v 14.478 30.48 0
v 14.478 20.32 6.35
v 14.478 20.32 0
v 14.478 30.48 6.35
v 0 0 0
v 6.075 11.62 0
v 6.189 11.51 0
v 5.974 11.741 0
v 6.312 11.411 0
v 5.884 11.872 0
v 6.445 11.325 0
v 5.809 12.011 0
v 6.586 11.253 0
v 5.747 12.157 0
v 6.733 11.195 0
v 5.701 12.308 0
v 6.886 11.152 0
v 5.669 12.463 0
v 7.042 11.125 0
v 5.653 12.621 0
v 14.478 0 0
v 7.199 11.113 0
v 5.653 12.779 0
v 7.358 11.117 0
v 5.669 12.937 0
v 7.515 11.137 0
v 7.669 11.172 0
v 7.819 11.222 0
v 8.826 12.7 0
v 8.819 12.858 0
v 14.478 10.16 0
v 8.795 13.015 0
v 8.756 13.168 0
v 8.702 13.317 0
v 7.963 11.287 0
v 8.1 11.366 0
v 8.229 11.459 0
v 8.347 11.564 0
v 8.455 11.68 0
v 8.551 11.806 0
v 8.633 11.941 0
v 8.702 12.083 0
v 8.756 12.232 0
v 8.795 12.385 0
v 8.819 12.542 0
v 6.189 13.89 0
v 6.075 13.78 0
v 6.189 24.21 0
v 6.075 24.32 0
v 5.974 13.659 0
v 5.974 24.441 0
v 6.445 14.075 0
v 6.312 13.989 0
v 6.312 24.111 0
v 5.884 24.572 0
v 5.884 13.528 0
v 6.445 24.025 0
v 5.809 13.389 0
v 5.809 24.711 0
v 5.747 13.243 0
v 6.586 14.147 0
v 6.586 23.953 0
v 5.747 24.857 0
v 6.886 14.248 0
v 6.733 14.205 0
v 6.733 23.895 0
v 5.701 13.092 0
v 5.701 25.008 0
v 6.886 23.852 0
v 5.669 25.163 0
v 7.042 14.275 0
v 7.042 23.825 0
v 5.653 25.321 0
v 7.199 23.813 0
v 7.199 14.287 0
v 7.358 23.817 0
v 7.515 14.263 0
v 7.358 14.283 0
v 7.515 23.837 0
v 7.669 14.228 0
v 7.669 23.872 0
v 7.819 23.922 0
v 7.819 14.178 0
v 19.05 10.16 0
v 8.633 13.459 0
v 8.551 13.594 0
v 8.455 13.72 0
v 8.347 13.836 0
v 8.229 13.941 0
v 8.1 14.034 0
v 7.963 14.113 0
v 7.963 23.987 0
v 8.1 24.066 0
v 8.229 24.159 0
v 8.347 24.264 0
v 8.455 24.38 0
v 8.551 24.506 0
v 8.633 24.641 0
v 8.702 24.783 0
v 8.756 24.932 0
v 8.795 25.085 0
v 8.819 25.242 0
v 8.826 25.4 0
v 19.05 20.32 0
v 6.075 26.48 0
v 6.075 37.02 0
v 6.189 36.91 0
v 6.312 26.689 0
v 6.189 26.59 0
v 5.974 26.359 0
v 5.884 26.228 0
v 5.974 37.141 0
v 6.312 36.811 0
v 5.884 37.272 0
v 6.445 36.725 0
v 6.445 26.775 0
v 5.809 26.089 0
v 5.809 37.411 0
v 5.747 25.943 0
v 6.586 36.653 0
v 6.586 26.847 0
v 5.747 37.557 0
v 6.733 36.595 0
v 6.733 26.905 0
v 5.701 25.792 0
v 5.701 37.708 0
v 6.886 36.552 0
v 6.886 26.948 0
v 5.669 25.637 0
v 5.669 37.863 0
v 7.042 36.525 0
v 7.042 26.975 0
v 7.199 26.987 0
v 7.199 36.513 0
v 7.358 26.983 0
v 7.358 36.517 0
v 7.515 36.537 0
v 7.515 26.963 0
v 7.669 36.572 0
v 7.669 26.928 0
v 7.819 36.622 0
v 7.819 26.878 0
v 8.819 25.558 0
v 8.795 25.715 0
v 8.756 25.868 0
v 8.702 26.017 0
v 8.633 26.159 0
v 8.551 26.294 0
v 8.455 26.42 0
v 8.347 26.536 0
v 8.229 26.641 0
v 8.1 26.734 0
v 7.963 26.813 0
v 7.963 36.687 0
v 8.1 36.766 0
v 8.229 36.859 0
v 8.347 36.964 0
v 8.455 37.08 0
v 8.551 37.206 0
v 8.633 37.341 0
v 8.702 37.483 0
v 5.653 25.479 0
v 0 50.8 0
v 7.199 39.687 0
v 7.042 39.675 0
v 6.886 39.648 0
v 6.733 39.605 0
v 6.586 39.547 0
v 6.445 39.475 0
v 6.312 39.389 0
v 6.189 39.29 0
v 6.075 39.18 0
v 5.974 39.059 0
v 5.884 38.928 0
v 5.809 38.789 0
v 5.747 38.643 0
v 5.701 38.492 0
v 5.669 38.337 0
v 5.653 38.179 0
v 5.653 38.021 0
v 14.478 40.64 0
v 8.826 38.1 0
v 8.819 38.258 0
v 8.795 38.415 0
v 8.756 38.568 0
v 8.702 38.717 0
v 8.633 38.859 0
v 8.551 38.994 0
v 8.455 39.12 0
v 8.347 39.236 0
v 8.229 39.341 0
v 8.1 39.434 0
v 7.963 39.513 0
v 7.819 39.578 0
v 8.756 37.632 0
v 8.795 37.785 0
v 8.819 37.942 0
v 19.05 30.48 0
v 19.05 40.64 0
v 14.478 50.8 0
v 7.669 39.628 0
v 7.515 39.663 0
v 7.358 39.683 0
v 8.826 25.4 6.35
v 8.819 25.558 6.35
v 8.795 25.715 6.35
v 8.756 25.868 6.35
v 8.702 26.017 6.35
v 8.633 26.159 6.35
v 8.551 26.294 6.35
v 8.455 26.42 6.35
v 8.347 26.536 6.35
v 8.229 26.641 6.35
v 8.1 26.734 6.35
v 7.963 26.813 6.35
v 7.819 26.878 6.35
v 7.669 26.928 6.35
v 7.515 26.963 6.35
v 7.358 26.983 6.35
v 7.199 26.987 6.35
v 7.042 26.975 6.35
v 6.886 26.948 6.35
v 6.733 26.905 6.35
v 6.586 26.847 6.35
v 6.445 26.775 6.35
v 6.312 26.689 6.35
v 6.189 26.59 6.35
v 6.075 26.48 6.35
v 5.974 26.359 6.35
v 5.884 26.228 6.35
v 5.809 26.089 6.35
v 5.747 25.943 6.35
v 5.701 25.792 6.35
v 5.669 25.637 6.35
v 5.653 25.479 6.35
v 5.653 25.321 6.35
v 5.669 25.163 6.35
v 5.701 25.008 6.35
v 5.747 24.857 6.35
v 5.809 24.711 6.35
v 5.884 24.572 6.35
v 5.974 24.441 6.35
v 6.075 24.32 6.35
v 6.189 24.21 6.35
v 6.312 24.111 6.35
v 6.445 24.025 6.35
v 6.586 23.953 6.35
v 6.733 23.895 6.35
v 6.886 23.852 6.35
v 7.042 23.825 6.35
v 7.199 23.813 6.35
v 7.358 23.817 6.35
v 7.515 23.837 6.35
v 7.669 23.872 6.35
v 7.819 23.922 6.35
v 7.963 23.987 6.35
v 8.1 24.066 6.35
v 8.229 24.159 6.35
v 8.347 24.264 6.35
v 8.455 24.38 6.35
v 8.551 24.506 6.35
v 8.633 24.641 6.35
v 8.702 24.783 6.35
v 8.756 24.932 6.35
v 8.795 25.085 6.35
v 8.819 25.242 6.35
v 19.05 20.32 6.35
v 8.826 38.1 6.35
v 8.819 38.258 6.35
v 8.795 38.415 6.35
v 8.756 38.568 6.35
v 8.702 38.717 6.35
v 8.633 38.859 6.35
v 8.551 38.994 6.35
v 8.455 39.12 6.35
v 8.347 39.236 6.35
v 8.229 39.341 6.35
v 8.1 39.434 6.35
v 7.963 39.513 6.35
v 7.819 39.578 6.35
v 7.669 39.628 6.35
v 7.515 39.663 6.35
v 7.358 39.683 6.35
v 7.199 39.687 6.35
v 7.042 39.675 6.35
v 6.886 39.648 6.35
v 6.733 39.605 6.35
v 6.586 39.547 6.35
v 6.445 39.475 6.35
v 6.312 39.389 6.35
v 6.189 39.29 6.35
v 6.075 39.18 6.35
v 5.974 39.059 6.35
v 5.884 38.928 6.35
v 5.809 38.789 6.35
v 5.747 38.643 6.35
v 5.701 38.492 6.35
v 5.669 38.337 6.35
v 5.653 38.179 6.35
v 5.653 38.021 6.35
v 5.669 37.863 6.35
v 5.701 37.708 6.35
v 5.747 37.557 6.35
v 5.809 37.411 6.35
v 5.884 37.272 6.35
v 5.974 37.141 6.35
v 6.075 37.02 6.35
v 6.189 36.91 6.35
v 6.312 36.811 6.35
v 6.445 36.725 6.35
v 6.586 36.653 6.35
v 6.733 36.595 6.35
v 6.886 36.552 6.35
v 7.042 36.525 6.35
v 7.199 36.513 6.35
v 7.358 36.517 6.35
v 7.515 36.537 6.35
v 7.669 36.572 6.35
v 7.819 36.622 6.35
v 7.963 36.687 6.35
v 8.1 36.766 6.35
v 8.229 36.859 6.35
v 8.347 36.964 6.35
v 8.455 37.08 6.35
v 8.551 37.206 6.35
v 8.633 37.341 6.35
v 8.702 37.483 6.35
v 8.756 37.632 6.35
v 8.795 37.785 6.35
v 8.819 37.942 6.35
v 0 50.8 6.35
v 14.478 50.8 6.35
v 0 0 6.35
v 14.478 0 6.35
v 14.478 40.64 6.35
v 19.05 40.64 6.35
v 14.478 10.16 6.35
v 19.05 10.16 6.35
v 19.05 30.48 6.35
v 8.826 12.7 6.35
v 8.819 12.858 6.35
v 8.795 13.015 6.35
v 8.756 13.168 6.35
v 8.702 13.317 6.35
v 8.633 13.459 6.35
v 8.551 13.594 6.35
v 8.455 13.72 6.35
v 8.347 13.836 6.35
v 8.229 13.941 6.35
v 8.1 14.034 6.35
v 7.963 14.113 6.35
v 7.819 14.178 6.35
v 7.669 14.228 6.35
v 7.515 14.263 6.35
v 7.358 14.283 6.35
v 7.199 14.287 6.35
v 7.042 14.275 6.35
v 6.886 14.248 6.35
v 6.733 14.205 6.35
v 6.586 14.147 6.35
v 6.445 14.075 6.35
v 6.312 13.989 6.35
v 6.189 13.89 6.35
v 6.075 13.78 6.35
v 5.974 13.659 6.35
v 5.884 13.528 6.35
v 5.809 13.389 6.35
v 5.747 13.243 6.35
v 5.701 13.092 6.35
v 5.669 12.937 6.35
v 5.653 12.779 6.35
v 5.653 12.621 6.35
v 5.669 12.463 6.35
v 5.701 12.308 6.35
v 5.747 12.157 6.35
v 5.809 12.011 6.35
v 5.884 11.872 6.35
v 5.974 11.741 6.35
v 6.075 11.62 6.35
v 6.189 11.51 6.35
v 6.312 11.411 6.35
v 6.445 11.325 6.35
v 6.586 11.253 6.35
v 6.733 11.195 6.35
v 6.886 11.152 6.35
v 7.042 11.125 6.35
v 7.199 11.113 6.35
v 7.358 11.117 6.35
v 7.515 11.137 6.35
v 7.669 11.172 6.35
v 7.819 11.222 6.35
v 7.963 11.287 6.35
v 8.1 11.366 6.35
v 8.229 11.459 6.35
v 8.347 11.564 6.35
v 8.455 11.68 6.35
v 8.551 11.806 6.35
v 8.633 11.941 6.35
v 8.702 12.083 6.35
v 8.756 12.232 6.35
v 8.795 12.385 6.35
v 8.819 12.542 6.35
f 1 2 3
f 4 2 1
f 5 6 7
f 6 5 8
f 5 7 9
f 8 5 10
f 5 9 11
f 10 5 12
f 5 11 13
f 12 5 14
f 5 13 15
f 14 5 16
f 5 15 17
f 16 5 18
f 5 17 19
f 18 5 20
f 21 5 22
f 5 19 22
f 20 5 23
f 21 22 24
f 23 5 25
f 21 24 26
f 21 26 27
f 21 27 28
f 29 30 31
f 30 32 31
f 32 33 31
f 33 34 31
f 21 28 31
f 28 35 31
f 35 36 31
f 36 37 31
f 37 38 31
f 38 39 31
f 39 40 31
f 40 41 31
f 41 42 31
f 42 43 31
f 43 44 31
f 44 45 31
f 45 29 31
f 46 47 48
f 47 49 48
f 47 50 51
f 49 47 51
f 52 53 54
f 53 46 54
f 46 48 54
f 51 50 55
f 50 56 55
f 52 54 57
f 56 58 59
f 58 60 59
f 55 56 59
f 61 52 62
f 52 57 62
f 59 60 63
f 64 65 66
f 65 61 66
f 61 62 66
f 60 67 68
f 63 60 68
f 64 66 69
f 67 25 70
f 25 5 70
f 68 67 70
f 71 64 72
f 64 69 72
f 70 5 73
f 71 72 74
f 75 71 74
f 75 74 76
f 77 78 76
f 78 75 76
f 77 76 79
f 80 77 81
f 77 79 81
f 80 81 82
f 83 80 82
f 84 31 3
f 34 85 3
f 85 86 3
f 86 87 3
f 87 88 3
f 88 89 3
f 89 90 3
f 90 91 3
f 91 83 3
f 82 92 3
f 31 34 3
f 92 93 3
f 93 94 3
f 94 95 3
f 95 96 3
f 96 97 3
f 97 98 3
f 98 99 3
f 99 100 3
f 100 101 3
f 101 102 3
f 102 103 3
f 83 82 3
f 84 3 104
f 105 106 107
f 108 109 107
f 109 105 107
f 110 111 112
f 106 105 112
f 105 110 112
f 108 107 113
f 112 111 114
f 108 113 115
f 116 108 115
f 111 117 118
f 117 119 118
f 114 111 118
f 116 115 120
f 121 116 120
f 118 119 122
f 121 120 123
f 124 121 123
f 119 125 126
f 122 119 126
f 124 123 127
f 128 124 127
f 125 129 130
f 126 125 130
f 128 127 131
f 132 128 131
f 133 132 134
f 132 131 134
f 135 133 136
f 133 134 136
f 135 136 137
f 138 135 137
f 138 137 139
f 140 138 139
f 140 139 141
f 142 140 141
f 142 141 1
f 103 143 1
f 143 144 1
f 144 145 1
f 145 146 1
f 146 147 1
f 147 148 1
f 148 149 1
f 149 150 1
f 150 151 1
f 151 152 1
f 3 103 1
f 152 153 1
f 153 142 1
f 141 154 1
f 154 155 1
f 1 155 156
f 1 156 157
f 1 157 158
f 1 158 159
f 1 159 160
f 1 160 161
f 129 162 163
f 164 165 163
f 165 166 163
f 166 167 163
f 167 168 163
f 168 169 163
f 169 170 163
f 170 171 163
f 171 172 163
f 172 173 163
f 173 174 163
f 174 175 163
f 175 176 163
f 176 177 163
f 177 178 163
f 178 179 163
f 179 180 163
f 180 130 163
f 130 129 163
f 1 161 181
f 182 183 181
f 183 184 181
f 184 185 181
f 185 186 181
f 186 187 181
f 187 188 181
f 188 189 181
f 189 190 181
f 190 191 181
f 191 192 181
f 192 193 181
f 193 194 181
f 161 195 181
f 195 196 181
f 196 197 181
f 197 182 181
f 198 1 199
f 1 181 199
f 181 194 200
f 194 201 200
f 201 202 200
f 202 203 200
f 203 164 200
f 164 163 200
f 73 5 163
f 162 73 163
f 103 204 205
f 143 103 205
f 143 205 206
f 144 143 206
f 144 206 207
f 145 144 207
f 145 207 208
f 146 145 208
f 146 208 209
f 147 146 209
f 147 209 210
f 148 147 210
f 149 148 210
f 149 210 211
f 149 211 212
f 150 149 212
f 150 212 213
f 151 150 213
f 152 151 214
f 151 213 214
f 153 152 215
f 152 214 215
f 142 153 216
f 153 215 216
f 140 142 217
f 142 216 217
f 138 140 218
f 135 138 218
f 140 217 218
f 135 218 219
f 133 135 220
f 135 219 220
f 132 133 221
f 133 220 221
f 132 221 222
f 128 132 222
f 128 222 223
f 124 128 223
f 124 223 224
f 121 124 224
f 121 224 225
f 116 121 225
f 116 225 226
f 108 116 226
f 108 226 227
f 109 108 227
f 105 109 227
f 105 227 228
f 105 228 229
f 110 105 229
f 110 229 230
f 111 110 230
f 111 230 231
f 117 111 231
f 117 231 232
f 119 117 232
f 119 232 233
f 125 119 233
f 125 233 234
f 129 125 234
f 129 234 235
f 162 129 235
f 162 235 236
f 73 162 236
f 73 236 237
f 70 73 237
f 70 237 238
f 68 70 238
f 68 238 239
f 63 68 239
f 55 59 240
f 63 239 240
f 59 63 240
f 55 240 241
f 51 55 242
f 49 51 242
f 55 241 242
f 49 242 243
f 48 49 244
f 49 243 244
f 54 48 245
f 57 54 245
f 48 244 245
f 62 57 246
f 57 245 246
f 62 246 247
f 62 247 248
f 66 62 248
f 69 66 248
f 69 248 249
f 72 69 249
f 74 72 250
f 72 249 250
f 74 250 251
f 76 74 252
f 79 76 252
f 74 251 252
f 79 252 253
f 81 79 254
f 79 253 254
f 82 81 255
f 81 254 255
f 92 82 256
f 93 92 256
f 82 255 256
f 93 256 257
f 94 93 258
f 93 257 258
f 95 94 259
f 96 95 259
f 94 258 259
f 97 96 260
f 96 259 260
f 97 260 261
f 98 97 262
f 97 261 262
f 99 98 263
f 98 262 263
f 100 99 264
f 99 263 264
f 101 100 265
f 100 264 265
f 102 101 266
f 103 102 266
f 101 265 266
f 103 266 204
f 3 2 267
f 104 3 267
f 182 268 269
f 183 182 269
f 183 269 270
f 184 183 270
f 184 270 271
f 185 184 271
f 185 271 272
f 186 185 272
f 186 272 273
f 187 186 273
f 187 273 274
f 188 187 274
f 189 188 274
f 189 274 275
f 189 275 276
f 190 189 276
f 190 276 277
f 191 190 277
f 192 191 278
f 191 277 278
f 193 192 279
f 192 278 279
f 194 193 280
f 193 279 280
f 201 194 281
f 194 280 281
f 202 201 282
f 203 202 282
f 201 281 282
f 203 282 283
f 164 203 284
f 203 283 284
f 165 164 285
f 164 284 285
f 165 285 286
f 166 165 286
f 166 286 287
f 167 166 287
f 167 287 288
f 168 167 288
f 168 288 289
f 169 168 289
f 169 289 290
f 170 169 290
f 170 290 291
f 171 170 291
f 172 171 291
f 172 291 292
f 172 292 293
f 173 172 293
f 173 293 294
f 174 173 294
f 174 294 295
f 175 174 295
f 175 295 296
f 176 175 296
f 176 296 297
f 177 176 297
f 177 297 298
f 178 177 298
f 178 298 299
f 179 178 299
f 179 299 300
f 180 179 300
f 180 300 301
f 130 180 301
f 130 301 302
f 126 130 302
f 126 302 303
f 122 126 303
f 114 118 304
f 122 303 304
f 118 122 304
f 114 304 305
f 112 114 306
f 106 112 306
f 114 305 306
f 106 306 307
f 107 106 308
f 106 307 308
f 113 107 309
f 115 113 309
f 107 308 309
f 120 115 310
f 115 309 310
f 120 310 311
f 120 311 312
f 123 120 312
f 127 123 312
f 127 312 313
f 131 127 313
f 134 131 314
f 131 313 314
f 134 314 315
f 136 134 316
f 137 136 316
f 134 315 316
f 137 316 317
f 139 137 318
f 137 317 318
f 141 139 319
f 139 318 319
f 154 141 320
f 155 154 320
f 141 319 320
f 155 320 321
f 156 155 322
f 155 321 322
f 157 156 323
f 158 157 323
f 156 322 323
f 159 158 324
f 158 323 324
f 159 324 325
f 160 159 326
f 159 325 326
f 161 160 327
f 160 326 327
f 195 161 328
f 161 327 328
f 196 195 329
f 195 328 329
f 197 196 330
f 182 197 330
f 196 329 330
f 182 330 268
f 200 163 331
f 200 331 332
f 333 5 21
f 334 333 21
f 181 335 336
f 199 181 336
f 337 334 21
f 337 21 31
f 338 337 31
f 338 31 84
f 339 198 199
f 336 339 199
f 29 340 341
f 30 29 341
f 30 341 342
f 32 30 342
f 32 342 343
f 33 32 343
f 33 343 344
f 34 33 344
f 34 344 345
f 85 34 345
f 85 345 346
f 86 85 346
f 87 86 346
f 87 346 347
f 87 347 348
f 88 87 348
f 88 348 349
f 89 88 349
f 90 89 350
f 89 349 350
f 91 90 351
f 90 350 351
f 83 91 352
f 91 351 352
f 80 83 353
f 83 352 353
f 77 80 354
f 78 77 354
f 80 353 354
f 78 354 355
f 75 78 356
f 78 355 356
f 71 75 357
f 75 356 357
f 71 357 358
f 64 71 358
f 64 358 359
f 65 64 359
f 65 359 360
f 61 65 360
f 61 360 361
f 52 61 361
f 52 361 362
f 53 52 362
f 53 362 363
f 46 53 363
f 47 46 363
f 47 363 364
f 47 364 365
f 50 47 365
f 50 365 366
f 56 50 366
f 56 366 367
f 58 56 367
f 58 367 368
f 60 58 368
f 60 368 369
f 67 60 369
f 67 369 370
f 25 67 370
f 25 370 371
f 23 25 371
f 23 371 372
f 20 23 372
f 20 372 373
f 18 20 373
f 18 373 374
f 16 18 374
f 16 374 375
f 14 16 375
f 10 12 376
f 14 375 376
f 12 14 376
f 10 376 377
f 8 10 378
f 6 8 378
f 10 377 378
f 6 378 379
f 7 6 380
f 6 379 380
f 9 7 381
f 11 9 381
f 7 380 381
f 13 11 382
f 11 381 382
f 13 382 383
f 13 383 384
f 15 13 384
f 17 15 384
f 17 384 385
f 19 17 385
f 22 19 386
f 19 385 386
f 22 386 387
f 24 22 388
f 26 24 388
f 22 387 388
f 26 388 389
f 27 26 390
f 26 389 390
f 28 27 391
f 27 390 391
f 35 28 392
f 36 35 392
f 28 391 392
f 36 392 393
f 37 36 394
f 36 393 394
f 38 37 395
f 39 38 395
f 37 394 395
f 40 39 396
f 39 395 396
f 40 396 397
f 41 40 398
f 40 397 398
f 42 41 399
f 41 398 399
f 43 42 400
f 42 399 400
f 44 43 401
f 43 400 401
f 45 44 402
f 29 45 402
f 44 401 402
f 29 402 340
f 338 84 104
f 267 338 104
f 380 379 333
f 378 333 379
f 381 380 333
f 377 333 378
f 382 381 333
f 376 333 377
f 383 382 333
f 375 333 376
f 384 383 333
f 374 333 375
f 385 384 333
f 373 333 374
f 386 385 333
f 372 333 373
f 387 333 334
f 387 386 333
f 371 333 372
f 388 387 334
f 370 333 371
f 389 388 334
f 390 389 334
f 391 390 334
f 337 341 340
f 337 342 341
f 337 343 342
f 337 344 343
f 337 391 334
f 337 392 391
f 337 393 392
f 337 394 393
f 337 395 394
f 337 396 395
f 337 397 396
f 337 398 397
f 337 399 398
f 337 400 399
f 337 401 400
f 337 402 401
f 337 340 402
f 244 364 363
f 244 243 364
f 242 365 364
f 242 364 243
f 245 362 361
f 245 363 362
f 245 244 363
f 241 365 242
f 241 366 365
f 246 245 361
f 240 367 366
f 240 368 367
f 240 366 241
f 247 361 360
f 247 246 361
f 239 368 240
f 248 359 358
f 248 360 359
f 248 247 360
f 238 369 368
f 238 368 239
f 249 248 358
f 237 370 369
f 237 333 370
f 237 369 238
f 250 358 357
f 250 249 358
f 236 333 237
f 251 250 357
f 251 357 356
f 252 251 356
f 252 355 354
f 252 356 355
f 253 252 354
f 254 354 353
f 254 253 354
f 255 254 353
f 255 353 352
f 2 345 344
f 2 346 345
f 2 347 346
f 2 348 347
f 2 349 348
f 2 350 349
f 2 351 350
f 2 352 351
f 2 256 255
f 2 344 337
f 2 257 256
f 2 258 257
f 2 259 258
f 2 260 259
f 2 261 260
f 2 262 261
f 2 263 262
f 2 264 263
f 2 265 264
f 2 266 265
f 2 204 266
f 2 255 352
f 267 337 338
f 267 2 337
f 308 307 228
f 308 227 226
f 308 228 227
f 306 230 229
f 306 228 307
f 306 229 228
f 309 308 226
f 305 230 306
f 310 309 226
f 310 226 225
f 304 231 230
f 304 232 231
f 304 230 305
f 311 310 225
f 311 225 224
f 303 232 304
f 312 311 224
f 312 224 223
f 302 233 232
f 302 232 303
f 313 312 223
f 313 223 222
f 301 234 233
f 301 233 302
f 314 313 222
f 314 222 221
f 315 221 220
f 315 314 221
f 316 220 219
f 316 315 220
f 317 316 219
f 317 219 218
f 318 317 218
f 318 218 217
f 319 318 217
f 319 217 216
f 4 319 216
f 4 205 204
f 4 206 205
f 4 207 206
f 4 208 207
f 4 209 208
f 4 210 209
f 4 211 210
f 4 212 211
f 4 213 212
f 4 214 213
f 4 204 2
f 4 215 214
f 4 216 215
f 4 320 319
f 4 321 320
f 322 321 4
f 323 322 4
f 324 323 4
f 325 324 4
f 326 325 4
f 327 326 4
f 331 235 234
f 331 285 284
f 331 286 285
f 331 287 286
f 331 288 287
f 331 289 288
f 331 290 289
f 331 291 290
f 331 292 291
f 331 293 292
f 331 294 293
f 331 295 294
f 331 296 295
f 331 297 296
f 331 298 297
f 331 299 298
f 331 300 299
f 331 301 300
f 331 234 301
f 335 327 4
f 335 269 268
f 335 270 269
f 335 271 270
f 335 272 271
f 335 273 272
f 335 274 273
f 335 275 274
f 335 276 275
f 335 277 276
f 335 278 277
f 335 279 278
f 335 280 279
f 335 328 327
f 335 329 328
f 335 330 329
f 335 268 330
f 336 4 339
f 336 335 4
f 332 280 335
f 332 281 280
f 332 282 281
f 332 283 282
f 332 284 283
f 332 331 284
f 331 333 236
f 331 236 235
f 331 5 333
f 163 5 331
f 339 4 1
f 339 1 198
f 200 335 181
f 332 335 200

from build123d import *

# Parameters (mm, degrees)
SKETCH1_W           = 19.05
SKETCH1_H           = 50.8
BOSS_EXTRUDE1_DEPTH = 6.35
SKETCH2_W           = 4.572
SKETCH2_H           = 10.16
CUT_EXTRUDE1_DEPTH  = 7.35
SKETCH3_R           = 1.5875
CUT_EXTRUDE2_DEPTH  = 7.35


with BuildPart() as part:
    # Sketch1 → Boss-Extrude1 (new body)
    with BuildSketch(Plane.XY):
        with Locations((9.525, 25.4)):
            Rectangle(SKETCH1_W, SKETCH1_H)
    extrude(amount=BOSS_EXTRUDE1_DEPTH)

    # Sketch2 → Cut-Extrude1 (cut, through all)
    with BuildSketch(Plane.XY.offset(6.35)):
        with Locations((16.764, 45.72)):
            Rectangle(SKETCH2_W, SKETCH2_H)
        with Locations((16.764, 25.4)):
            Rectangle(SKETCH2_W, SKETCH2_H)
        with Locations((16.764, 5.08)):
            Rectangle(SKETCH2_W, SKETCH2_H)
    extrude(amount=-CUT_EXTRUDE1_DEPTH, mode=Mode.SUBTRACT)

    # Sketch3 → Cut-Extrude2 (cut, through all)
    with BuildSketch(Plane.XY.offset(6.35)):
        with Locations((7.239, 38.1)):
            Circle(SKETCH3_R)
        with Locations((7.239, 25.4)):
            Circle(SKETCH3_R)
        with Locations((7.239, 12.7)):
            Circle(SKETCH3_R)
    extrude(amount=-CUT_EXTRUDE2_DEPTH, mode=Mode.SUBTRACT)


solid = part.part
